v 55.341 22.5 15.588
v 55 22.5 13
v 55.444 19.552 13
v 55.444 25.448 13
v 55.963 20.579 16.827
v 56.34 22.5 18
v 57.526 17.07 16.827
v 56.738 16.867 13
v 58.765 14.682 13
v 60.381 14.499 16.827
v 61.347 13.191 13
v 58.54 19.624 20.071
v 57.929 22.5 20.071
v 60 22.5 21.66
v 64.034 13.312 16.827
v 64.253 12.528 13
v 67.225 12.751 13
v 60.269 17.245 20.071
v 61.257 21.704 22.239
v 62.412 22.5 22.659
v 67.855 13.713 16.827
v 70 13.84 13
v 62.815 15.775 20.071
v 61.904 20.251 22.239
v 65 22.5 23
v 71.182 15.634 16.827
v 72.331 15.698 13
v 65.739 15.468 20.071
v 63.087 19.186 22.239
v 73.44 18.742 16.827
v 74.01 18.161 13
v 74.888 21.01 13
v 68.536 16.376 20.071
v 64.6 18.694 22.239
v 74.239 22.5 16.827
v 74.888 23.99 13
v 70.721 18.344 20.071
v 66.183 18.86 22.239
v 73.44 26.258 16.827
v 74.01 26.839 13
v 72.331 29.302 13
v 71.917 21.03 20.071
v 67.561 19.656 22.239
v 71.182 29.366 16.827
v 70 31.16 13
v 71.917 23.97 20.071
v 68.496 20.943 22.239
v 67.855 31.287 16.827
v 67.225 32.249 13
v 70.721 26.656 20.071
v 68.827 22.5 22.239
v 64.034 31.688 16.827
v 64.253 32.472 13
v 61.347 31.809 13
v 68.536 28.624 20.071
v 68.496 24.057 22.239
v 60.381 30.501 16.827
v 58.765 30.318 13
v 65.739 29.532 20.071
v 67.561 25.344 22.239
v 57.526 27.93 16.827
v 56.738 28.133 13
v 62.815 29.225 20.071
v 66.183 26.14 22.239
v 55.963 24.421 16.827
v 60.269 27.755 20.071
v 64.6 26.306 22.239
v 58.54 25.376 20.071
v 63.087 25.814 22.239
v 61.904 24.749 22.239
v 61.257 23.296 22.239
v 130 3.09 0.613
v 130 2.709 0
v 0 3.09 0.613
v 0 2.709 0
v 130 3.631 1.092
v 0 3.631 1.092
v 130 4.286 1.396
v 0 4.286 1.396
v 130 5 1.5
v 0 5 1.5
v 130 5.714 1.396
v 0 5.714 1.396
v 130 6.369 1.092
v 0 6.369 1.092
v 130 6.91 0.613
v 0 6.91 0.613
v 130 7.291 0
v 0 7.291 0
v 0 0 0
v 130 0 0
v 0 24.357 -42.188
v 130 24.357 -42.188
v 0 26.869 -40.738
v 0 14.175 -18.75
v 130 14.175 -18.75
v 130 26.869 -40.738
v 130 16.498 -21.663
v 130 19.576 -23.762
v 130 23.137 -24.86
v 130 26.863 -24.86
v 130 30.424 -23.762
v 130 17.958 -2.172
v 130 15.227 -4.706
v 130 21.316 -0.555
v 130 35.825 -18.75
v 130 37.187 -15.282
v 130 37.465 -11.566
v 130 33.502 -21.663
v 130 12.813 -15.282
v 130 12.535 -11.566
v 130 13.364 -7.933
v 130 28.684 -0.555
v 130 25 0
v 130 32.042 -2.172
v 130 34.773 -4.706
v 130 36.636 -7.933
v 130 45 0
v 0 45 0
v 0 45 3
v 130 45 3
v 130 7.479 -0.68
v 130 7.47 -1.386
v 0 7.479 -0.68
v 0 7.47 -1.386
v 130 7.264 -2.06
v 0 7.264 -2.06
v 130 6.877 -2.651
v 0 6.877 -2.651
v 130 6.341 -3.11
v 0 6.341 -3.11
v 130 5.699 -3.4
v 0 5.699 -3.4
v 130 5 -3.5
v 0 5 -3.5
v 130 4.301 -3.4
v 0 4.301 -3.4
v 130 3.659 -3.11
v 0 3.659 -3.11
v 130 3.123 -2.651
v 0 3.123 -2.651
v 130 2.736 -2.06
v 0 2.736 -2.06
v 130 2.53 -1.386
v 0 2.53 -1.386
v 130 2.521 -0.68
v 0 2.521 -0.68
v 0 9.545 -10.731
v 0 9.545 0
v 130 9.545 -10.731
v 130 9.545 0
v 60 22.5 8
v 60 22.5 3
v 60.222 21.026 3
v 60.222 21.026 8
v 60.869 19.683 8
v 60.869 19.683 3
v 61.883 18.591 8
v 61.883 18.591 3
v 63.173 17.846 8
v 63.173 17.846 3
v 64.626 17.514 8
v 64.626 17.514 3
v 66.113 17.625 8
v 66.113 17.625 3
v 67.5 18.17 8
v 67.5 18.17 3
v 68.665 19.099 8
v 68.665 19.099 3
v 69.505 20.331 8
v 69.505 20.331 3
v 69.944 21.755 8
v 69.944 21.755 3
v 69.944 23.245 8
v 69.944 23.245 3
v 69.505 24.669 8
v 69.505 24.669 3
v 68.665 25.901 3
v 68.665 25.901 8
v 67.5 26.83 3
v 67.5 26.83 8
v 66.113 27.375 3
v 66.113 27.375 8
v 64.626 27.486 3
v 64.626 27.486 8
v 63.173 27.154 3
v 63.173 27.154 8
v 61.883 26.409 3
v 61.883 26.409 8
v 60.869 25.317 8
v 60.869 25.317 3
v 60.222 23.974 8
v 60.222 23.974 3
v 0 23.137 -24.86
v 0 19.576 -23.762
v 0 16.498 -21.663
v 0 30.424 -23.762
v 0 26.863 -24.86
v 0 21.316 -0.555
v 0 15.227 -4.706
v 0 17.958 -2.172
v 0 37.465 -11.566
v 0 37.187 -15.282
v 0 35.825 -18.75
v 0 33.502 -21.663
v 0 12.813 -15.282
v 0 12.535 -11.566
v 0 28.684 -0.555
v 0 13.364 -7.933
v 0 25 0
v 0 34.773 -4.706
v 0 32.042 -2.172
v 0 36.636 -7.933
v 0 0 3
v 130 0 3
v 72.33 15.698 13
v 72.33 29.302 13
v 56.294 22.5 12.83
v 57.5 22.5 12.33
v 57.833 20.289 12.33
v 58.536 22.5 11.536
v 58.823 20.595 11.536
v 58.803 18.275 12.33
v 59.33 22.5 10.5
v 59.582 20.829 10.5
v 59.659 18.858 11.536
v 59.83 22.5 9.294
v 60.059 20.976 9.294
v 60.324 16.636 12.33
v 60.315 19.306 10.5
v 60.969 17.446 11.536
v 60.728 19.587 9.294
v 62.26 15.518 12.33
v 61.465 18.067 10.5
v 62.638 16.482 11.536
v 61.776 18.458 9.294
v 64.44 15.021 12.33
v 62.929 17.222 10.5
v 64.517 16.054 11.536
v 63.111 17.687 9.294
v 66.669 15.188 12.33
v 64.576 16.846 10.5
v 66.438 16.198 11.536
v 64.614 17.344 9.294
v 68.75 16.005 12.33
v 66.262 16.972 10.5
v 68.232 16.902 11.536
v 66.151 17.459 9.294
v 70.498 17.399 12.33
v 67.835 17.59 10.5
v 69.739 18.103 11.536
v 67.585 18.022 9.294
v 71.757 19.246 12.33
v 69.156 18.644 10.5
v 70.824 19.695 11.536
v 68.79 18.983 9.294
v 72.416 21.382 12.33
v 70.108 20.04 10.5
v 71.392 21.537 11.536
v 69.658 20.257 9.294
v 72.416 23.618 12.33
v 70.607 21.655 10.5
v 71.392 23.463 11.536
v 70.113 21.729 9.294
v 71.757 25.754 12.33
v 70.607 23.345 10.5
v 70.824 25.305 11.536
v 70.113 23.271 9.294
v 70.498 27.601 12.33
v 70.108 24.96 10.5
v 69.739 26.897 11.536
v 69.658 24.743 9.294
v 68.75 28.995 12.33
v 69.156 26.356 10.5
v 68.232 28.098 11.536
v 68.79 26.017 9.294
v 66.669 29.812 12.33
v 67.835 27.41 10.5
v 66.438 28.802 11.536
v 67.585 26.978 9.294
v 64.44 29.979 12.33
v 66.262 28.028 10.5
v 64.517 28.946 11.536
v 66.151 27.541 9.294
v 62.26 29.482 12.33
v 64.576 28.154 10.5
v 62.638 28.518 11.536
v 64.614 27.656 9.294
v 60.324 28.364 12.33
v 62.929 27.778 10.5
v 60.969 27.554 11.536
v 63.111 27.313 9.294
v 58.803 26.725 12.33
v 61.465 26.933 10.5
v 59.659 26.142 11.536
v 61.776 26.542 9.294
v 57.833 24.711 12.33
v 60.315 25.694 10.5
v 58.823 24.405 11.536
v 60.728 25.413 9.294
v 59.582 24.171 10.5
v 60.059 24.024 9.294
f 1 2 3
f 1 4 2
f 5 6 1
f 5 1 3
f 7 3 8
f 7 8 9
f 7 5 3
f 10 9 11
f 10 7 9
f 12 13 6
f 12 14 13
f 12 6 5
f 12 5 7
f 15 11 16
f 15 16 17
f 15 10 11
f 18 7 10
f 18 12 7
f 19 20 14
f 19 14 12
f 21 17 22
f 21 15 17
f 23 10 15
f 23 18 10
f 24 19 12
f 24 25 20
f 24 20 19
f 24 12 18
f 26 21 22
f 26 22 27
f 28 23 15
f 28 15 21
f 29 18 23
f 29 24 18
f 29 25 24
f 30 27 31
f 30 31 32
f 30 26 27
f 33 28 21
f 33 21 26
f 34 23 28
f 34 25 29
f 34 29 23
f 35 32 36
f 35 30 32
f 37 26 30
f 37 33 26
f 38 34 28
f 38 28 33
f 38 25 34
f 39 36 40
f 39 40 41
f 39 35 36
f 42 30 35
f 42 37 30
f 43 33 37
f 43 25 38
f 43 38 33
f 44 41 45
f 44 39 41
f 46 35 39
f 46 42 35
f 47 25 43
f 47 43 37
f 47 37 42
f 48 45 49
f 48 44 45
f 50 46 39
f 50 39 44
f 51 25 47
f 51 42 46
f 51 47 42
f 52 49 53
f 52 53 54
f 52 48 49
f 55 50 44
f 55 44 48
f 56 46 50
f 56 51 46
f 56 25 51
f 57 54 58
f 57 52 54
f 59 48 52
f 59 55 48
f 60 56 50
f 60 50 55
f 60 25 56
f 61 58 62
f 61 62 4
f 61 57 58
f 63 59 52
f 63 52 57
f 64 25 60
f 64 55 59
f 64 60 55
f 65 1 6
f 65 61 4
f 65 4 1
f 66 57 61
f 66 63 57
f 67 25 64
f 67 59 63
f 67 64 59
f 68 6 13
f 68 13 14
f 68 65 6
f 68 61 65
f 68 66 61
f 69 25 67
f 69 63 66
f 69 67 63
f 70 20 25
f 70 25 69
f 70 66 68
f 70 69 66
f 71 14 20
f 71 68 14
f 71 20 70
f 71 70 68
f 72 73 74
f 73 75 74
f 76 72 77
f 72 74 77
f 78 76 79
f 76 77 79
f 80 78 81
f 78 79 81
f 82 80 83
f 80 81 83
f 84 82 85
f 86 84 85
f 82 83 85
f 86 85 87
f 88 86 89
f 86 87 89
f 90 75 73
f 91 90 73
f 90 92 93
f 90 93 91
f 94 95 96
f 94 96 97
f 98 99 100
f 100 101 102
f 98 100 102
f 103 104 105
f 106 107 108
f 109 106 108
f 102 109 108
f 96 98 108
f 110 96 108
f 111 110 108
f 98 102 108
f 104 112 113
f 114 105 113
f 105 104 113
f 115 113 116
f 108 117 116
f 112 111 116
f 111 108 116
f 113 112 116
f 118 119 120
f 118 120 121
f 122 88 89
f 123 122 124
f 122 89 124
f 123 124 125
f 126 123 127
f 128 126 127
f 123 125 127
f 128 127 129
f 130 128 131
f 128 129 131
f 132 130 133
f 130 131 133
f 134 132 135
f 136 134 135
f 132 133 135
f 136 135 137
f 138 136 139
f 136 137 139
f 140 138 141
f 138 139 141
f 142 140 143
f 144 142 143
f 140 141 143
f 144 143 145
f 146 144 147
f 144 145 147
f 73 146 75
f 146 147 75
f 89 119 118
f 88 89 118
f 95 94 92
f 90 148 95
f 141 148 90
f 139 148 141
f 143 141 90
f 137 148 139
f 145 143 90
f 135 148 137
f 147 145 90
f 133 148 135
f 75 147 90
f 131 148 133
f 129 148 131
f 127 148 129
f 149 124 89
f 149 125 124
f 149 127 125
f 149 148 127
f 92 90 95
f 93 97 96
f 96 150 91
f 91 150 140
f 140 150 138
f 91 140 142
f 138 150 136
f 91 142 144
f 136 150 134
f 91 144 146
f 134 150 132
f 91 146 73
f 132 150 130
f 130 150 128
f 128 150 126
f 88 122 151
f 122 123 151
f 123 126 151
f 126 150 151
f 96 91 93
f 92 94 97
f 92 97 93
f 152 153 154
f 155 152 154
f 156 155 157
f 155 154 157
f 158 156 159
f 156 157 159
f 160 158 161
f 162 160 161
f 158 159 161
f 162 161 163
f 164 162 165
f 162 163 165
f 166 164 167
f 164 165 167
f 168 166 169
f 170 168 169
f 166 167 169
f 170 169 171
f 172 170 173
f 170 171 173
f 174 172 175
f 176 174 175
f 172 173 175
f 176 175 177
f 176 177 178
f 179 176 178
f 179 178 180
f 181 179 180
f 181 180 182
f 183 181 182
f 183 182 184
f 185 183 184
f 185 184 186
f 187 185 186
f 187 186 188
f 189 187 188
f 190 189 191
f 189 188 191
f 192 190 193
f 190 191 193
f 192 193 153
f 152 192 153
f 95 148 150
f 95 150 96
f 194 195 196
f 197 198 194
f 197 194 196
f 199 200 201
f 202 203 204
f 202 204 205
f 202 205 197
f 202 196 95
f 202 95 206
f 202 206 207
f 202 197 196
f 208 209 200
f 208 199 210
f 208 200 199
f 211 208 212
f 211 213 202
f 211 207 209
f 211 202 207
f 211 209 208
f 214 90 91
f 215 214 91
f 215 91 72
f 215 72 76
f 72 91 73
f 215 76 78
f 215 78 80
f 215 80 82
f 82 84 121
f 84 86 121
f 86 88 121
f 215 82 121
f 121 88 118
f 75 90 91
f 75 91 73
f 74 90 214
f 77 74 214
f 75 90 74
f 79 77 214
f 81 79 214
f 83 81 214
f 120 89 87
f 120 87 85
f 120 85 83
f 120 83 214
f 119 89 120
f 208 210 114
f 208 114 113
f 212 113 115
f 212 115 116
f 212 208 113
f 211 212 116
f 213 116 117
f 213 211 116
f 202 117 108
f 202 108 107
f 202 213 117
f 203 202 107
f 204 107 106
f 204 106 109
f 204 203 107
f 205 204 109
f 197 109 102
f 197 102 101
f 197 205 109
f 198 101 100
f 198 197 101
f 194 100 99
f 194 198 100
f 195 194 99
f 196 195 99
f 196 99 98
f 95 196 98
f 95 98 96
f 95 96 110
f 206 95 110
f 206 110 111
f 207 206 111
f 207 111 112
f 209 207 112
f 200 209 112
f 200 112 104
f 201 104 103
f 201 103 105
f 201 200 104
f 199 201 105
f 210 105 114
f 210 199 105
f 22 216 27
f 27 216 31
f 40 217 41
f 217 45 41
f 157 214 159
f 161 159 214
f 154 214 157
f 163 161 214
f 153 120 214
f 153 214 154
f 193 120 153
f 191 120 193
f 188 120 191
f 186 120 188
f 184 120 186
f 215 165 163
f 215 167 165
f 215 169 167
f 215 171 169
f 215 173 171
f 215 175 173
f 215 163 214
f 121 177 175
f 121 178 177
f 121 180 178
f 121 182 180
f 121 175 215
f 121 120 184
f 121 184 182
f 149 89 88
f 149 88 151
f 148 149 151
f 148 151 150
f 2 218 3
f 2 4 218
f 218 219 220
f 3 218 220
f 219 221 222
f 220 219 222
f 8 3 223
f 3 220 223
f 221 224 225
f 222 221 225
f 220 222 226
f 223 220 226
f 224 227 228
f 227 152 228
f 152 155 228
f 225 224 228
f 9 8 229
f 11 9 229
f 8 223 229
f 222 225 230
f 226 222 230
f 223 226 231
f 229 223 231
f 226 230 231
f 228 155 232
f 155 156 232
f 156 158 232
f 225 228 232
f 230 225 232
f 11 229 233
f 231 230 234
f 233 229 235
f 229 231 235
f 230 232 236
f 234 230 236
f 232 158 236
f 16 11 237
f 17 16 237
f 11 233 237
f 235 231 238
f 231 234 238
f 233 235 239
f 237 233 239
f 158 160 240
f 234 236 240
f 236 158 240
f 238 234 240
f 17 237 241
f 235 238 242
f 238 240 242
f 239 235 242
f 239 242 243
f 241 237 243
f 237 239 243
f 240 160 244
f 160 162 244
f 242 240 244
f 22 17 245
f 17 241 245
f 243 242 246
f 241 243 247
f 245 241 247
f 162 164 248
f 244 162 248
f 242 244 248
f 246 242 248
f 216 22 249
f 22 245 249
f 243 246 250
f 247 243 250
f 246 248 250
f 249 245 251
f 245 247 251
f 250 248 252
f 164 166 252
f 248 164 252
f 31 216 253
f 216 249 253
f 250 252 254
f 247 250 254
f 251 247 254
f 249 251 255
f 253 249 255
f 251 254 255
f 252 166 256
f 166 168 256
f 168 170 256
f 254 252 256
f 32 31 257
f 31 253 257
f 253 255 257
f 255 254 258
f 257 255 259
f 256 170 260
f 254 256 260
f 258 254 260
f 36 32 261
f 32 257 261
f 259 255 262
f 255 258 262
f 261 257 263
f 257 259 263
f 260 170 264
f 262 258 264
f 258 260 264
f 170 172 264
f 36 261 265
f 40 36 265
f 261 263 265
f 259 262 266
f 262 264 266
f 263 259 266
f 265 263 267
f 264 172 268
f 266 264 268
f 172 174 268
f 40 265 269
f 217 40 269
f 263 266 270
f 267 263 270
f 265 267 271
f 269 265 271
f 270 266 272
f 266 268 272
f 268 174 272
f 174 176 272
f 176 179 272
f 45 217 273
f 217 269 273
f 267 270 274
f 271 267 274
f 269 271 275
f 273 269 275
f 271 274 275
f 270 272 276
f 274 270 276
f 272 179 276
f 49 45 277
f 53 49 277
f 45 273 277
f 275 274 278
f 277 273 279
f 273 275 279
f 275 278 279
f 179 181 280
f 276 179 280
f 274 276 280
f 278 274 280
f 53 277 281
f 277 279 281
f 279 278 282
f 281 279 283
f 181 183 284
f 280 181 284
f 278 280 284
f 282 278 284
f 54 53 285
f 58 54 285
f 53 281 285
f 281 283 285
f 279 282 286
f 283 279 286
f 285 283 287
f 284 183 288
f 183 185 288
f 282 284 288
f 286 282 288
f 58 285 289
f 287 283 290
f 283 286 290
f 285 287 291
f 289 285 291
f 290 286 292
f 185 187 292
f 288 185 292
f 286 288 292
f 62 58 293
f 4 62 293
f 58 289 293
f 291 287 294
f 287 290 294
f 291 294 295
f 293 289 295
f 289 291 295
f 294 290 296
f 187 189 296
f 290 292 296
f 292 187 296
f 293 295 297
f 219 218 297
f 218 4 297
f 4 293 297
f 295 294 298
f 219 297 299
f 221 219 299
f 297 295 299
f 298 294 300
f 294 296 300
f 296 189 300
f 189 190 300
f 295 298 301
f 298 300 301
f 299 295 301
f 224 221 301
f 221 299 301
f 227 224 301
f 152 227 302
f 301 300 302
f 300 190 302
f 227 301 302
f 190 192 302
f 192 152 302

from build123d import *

# Parameters (mm, degrees)
SKETCH1_W             = 130
SKETCH1_H             = 45
BOSS_EXTRUDE1_DEPTH   = 3
SKETCH3_R             = 10
BOSS_EXTRUDE2_DEPTH   = 20
FILLET1_R             = 10
SKETCH4_R             = 10
SKETCH4_R_2           = 5
CUT_EXTRUDE3_DEPTH    = 10
FILLET2_R             = 5
SKETCH5_R             = 12.5
BOSS_EXTRUDE3_DEPTH   = 130
BOSS_EXTRUDE3_2_DEPTH = 130
SKETCH6_R             = 2.5
CUT_EXTRUDE4_DEPTH    = 130


with BuildPart() as part:
    # Sketch1 → Boss-Extrude1 (new body)
    with BuildSketch(Plane.XY):
        with Locations((65, 22.5)):
            Rectangle(SKETCH1_W, SKETCH1_H)
    extrude(amount=BOSS_EXTRUDE1_DEPTH)

    # Sketch3 → Boss-Extrude2 (add)
    with BuildSketch(Plane.XY.offset(3)):
        with Locations(Location((65, 22.5, 0), (0, 0, 180))):
            Circle(SKETCH3_R)
    extrude(amount=BOSS_EXTRUDE2_DEPTH)

    # Fillet1
    fillet1_edges = [part.edges().sort_by_distance(p)[0] for p in [
        (75, 22.5, 23),
    ]]
    fillet(fillet1_edges, radius=FILLET1_R)

    # Sketch4 → Cut-Extrude3 (cut)
    with BuildSketch(Plane.XY.offset(3)):
        with Locations((65, 22.5)):
            Circle(SKETCH4_R)
        with Locations(Location((65, 22.5, 0), (0, 0, 180))):
            Circle(SKETCH4_R_2, mode=Mode.SUBTRACT)
    extrude(amount=CUT_EXTRUDE3_DEPTH, mode=Mode.SUBTRACT)

    # Fillet2
    fillet2_edges = [part.edges().sort_by_distance(p)[0] for p in [
        (70, 22.5, 13),
    ]]
    fillet(fillet2_edges, radius=FILLET2_R - 0.0001)  # a hair under: the kernel refuses the full size


with BuildPart() as body_2:
    # Sketch5 → Boss-Extrude3 (new body)
    with BuildSketch(Plane.ZY):
        with Locations((-12.5, 25)):
            Circle(SKETCH5_R)
    extrude(amount=-BOSS_EXTRUDE3_DEPTH)


with BuildPart() as body_3:
    # Sketch5 → Boss-Extrude3 2 (new body)
    with BuildSketch(Plane.ZY):
        Polygon((-42.187986713, 24.357245486), (0, 0), (0, 9.544756876), (-10.730733666, 9.544756876), (-18.750000123, 14.174682524), (-40.737669166, 26.869269165), align=None)
    extrude(amount=-BOSS_EXTRUDE3_2_DEPTH)


with BuildPart() as cut_extrude4_tool:
    # Sketch6 → Cut-Extrude4 (new body)
    with BuildSketch(Plane.ZY):
        with Locations((-1, 5)):
            Circle(SKETCH6_R)
    extrude(amount=-CUT_EXTRUDE4_DEPTH)


with BuildPart() as part_1:
    add(part.part)

    # Cut-Extrude4: cut by cut_extrude4_tool
    add(cut_extrude4_tool.part, mode=Mode.SUBTRACT)


with BuildPart() as body_3_1:
    add(body_3.part)

    # Cut-Extrude4: cut by cut_extrude4_tool
    add(cut_extrude4_tool.part, mode=Mode.SUBTRACT)


solid = Compound([body_2.part, part_1.part, body_3_1.part])
